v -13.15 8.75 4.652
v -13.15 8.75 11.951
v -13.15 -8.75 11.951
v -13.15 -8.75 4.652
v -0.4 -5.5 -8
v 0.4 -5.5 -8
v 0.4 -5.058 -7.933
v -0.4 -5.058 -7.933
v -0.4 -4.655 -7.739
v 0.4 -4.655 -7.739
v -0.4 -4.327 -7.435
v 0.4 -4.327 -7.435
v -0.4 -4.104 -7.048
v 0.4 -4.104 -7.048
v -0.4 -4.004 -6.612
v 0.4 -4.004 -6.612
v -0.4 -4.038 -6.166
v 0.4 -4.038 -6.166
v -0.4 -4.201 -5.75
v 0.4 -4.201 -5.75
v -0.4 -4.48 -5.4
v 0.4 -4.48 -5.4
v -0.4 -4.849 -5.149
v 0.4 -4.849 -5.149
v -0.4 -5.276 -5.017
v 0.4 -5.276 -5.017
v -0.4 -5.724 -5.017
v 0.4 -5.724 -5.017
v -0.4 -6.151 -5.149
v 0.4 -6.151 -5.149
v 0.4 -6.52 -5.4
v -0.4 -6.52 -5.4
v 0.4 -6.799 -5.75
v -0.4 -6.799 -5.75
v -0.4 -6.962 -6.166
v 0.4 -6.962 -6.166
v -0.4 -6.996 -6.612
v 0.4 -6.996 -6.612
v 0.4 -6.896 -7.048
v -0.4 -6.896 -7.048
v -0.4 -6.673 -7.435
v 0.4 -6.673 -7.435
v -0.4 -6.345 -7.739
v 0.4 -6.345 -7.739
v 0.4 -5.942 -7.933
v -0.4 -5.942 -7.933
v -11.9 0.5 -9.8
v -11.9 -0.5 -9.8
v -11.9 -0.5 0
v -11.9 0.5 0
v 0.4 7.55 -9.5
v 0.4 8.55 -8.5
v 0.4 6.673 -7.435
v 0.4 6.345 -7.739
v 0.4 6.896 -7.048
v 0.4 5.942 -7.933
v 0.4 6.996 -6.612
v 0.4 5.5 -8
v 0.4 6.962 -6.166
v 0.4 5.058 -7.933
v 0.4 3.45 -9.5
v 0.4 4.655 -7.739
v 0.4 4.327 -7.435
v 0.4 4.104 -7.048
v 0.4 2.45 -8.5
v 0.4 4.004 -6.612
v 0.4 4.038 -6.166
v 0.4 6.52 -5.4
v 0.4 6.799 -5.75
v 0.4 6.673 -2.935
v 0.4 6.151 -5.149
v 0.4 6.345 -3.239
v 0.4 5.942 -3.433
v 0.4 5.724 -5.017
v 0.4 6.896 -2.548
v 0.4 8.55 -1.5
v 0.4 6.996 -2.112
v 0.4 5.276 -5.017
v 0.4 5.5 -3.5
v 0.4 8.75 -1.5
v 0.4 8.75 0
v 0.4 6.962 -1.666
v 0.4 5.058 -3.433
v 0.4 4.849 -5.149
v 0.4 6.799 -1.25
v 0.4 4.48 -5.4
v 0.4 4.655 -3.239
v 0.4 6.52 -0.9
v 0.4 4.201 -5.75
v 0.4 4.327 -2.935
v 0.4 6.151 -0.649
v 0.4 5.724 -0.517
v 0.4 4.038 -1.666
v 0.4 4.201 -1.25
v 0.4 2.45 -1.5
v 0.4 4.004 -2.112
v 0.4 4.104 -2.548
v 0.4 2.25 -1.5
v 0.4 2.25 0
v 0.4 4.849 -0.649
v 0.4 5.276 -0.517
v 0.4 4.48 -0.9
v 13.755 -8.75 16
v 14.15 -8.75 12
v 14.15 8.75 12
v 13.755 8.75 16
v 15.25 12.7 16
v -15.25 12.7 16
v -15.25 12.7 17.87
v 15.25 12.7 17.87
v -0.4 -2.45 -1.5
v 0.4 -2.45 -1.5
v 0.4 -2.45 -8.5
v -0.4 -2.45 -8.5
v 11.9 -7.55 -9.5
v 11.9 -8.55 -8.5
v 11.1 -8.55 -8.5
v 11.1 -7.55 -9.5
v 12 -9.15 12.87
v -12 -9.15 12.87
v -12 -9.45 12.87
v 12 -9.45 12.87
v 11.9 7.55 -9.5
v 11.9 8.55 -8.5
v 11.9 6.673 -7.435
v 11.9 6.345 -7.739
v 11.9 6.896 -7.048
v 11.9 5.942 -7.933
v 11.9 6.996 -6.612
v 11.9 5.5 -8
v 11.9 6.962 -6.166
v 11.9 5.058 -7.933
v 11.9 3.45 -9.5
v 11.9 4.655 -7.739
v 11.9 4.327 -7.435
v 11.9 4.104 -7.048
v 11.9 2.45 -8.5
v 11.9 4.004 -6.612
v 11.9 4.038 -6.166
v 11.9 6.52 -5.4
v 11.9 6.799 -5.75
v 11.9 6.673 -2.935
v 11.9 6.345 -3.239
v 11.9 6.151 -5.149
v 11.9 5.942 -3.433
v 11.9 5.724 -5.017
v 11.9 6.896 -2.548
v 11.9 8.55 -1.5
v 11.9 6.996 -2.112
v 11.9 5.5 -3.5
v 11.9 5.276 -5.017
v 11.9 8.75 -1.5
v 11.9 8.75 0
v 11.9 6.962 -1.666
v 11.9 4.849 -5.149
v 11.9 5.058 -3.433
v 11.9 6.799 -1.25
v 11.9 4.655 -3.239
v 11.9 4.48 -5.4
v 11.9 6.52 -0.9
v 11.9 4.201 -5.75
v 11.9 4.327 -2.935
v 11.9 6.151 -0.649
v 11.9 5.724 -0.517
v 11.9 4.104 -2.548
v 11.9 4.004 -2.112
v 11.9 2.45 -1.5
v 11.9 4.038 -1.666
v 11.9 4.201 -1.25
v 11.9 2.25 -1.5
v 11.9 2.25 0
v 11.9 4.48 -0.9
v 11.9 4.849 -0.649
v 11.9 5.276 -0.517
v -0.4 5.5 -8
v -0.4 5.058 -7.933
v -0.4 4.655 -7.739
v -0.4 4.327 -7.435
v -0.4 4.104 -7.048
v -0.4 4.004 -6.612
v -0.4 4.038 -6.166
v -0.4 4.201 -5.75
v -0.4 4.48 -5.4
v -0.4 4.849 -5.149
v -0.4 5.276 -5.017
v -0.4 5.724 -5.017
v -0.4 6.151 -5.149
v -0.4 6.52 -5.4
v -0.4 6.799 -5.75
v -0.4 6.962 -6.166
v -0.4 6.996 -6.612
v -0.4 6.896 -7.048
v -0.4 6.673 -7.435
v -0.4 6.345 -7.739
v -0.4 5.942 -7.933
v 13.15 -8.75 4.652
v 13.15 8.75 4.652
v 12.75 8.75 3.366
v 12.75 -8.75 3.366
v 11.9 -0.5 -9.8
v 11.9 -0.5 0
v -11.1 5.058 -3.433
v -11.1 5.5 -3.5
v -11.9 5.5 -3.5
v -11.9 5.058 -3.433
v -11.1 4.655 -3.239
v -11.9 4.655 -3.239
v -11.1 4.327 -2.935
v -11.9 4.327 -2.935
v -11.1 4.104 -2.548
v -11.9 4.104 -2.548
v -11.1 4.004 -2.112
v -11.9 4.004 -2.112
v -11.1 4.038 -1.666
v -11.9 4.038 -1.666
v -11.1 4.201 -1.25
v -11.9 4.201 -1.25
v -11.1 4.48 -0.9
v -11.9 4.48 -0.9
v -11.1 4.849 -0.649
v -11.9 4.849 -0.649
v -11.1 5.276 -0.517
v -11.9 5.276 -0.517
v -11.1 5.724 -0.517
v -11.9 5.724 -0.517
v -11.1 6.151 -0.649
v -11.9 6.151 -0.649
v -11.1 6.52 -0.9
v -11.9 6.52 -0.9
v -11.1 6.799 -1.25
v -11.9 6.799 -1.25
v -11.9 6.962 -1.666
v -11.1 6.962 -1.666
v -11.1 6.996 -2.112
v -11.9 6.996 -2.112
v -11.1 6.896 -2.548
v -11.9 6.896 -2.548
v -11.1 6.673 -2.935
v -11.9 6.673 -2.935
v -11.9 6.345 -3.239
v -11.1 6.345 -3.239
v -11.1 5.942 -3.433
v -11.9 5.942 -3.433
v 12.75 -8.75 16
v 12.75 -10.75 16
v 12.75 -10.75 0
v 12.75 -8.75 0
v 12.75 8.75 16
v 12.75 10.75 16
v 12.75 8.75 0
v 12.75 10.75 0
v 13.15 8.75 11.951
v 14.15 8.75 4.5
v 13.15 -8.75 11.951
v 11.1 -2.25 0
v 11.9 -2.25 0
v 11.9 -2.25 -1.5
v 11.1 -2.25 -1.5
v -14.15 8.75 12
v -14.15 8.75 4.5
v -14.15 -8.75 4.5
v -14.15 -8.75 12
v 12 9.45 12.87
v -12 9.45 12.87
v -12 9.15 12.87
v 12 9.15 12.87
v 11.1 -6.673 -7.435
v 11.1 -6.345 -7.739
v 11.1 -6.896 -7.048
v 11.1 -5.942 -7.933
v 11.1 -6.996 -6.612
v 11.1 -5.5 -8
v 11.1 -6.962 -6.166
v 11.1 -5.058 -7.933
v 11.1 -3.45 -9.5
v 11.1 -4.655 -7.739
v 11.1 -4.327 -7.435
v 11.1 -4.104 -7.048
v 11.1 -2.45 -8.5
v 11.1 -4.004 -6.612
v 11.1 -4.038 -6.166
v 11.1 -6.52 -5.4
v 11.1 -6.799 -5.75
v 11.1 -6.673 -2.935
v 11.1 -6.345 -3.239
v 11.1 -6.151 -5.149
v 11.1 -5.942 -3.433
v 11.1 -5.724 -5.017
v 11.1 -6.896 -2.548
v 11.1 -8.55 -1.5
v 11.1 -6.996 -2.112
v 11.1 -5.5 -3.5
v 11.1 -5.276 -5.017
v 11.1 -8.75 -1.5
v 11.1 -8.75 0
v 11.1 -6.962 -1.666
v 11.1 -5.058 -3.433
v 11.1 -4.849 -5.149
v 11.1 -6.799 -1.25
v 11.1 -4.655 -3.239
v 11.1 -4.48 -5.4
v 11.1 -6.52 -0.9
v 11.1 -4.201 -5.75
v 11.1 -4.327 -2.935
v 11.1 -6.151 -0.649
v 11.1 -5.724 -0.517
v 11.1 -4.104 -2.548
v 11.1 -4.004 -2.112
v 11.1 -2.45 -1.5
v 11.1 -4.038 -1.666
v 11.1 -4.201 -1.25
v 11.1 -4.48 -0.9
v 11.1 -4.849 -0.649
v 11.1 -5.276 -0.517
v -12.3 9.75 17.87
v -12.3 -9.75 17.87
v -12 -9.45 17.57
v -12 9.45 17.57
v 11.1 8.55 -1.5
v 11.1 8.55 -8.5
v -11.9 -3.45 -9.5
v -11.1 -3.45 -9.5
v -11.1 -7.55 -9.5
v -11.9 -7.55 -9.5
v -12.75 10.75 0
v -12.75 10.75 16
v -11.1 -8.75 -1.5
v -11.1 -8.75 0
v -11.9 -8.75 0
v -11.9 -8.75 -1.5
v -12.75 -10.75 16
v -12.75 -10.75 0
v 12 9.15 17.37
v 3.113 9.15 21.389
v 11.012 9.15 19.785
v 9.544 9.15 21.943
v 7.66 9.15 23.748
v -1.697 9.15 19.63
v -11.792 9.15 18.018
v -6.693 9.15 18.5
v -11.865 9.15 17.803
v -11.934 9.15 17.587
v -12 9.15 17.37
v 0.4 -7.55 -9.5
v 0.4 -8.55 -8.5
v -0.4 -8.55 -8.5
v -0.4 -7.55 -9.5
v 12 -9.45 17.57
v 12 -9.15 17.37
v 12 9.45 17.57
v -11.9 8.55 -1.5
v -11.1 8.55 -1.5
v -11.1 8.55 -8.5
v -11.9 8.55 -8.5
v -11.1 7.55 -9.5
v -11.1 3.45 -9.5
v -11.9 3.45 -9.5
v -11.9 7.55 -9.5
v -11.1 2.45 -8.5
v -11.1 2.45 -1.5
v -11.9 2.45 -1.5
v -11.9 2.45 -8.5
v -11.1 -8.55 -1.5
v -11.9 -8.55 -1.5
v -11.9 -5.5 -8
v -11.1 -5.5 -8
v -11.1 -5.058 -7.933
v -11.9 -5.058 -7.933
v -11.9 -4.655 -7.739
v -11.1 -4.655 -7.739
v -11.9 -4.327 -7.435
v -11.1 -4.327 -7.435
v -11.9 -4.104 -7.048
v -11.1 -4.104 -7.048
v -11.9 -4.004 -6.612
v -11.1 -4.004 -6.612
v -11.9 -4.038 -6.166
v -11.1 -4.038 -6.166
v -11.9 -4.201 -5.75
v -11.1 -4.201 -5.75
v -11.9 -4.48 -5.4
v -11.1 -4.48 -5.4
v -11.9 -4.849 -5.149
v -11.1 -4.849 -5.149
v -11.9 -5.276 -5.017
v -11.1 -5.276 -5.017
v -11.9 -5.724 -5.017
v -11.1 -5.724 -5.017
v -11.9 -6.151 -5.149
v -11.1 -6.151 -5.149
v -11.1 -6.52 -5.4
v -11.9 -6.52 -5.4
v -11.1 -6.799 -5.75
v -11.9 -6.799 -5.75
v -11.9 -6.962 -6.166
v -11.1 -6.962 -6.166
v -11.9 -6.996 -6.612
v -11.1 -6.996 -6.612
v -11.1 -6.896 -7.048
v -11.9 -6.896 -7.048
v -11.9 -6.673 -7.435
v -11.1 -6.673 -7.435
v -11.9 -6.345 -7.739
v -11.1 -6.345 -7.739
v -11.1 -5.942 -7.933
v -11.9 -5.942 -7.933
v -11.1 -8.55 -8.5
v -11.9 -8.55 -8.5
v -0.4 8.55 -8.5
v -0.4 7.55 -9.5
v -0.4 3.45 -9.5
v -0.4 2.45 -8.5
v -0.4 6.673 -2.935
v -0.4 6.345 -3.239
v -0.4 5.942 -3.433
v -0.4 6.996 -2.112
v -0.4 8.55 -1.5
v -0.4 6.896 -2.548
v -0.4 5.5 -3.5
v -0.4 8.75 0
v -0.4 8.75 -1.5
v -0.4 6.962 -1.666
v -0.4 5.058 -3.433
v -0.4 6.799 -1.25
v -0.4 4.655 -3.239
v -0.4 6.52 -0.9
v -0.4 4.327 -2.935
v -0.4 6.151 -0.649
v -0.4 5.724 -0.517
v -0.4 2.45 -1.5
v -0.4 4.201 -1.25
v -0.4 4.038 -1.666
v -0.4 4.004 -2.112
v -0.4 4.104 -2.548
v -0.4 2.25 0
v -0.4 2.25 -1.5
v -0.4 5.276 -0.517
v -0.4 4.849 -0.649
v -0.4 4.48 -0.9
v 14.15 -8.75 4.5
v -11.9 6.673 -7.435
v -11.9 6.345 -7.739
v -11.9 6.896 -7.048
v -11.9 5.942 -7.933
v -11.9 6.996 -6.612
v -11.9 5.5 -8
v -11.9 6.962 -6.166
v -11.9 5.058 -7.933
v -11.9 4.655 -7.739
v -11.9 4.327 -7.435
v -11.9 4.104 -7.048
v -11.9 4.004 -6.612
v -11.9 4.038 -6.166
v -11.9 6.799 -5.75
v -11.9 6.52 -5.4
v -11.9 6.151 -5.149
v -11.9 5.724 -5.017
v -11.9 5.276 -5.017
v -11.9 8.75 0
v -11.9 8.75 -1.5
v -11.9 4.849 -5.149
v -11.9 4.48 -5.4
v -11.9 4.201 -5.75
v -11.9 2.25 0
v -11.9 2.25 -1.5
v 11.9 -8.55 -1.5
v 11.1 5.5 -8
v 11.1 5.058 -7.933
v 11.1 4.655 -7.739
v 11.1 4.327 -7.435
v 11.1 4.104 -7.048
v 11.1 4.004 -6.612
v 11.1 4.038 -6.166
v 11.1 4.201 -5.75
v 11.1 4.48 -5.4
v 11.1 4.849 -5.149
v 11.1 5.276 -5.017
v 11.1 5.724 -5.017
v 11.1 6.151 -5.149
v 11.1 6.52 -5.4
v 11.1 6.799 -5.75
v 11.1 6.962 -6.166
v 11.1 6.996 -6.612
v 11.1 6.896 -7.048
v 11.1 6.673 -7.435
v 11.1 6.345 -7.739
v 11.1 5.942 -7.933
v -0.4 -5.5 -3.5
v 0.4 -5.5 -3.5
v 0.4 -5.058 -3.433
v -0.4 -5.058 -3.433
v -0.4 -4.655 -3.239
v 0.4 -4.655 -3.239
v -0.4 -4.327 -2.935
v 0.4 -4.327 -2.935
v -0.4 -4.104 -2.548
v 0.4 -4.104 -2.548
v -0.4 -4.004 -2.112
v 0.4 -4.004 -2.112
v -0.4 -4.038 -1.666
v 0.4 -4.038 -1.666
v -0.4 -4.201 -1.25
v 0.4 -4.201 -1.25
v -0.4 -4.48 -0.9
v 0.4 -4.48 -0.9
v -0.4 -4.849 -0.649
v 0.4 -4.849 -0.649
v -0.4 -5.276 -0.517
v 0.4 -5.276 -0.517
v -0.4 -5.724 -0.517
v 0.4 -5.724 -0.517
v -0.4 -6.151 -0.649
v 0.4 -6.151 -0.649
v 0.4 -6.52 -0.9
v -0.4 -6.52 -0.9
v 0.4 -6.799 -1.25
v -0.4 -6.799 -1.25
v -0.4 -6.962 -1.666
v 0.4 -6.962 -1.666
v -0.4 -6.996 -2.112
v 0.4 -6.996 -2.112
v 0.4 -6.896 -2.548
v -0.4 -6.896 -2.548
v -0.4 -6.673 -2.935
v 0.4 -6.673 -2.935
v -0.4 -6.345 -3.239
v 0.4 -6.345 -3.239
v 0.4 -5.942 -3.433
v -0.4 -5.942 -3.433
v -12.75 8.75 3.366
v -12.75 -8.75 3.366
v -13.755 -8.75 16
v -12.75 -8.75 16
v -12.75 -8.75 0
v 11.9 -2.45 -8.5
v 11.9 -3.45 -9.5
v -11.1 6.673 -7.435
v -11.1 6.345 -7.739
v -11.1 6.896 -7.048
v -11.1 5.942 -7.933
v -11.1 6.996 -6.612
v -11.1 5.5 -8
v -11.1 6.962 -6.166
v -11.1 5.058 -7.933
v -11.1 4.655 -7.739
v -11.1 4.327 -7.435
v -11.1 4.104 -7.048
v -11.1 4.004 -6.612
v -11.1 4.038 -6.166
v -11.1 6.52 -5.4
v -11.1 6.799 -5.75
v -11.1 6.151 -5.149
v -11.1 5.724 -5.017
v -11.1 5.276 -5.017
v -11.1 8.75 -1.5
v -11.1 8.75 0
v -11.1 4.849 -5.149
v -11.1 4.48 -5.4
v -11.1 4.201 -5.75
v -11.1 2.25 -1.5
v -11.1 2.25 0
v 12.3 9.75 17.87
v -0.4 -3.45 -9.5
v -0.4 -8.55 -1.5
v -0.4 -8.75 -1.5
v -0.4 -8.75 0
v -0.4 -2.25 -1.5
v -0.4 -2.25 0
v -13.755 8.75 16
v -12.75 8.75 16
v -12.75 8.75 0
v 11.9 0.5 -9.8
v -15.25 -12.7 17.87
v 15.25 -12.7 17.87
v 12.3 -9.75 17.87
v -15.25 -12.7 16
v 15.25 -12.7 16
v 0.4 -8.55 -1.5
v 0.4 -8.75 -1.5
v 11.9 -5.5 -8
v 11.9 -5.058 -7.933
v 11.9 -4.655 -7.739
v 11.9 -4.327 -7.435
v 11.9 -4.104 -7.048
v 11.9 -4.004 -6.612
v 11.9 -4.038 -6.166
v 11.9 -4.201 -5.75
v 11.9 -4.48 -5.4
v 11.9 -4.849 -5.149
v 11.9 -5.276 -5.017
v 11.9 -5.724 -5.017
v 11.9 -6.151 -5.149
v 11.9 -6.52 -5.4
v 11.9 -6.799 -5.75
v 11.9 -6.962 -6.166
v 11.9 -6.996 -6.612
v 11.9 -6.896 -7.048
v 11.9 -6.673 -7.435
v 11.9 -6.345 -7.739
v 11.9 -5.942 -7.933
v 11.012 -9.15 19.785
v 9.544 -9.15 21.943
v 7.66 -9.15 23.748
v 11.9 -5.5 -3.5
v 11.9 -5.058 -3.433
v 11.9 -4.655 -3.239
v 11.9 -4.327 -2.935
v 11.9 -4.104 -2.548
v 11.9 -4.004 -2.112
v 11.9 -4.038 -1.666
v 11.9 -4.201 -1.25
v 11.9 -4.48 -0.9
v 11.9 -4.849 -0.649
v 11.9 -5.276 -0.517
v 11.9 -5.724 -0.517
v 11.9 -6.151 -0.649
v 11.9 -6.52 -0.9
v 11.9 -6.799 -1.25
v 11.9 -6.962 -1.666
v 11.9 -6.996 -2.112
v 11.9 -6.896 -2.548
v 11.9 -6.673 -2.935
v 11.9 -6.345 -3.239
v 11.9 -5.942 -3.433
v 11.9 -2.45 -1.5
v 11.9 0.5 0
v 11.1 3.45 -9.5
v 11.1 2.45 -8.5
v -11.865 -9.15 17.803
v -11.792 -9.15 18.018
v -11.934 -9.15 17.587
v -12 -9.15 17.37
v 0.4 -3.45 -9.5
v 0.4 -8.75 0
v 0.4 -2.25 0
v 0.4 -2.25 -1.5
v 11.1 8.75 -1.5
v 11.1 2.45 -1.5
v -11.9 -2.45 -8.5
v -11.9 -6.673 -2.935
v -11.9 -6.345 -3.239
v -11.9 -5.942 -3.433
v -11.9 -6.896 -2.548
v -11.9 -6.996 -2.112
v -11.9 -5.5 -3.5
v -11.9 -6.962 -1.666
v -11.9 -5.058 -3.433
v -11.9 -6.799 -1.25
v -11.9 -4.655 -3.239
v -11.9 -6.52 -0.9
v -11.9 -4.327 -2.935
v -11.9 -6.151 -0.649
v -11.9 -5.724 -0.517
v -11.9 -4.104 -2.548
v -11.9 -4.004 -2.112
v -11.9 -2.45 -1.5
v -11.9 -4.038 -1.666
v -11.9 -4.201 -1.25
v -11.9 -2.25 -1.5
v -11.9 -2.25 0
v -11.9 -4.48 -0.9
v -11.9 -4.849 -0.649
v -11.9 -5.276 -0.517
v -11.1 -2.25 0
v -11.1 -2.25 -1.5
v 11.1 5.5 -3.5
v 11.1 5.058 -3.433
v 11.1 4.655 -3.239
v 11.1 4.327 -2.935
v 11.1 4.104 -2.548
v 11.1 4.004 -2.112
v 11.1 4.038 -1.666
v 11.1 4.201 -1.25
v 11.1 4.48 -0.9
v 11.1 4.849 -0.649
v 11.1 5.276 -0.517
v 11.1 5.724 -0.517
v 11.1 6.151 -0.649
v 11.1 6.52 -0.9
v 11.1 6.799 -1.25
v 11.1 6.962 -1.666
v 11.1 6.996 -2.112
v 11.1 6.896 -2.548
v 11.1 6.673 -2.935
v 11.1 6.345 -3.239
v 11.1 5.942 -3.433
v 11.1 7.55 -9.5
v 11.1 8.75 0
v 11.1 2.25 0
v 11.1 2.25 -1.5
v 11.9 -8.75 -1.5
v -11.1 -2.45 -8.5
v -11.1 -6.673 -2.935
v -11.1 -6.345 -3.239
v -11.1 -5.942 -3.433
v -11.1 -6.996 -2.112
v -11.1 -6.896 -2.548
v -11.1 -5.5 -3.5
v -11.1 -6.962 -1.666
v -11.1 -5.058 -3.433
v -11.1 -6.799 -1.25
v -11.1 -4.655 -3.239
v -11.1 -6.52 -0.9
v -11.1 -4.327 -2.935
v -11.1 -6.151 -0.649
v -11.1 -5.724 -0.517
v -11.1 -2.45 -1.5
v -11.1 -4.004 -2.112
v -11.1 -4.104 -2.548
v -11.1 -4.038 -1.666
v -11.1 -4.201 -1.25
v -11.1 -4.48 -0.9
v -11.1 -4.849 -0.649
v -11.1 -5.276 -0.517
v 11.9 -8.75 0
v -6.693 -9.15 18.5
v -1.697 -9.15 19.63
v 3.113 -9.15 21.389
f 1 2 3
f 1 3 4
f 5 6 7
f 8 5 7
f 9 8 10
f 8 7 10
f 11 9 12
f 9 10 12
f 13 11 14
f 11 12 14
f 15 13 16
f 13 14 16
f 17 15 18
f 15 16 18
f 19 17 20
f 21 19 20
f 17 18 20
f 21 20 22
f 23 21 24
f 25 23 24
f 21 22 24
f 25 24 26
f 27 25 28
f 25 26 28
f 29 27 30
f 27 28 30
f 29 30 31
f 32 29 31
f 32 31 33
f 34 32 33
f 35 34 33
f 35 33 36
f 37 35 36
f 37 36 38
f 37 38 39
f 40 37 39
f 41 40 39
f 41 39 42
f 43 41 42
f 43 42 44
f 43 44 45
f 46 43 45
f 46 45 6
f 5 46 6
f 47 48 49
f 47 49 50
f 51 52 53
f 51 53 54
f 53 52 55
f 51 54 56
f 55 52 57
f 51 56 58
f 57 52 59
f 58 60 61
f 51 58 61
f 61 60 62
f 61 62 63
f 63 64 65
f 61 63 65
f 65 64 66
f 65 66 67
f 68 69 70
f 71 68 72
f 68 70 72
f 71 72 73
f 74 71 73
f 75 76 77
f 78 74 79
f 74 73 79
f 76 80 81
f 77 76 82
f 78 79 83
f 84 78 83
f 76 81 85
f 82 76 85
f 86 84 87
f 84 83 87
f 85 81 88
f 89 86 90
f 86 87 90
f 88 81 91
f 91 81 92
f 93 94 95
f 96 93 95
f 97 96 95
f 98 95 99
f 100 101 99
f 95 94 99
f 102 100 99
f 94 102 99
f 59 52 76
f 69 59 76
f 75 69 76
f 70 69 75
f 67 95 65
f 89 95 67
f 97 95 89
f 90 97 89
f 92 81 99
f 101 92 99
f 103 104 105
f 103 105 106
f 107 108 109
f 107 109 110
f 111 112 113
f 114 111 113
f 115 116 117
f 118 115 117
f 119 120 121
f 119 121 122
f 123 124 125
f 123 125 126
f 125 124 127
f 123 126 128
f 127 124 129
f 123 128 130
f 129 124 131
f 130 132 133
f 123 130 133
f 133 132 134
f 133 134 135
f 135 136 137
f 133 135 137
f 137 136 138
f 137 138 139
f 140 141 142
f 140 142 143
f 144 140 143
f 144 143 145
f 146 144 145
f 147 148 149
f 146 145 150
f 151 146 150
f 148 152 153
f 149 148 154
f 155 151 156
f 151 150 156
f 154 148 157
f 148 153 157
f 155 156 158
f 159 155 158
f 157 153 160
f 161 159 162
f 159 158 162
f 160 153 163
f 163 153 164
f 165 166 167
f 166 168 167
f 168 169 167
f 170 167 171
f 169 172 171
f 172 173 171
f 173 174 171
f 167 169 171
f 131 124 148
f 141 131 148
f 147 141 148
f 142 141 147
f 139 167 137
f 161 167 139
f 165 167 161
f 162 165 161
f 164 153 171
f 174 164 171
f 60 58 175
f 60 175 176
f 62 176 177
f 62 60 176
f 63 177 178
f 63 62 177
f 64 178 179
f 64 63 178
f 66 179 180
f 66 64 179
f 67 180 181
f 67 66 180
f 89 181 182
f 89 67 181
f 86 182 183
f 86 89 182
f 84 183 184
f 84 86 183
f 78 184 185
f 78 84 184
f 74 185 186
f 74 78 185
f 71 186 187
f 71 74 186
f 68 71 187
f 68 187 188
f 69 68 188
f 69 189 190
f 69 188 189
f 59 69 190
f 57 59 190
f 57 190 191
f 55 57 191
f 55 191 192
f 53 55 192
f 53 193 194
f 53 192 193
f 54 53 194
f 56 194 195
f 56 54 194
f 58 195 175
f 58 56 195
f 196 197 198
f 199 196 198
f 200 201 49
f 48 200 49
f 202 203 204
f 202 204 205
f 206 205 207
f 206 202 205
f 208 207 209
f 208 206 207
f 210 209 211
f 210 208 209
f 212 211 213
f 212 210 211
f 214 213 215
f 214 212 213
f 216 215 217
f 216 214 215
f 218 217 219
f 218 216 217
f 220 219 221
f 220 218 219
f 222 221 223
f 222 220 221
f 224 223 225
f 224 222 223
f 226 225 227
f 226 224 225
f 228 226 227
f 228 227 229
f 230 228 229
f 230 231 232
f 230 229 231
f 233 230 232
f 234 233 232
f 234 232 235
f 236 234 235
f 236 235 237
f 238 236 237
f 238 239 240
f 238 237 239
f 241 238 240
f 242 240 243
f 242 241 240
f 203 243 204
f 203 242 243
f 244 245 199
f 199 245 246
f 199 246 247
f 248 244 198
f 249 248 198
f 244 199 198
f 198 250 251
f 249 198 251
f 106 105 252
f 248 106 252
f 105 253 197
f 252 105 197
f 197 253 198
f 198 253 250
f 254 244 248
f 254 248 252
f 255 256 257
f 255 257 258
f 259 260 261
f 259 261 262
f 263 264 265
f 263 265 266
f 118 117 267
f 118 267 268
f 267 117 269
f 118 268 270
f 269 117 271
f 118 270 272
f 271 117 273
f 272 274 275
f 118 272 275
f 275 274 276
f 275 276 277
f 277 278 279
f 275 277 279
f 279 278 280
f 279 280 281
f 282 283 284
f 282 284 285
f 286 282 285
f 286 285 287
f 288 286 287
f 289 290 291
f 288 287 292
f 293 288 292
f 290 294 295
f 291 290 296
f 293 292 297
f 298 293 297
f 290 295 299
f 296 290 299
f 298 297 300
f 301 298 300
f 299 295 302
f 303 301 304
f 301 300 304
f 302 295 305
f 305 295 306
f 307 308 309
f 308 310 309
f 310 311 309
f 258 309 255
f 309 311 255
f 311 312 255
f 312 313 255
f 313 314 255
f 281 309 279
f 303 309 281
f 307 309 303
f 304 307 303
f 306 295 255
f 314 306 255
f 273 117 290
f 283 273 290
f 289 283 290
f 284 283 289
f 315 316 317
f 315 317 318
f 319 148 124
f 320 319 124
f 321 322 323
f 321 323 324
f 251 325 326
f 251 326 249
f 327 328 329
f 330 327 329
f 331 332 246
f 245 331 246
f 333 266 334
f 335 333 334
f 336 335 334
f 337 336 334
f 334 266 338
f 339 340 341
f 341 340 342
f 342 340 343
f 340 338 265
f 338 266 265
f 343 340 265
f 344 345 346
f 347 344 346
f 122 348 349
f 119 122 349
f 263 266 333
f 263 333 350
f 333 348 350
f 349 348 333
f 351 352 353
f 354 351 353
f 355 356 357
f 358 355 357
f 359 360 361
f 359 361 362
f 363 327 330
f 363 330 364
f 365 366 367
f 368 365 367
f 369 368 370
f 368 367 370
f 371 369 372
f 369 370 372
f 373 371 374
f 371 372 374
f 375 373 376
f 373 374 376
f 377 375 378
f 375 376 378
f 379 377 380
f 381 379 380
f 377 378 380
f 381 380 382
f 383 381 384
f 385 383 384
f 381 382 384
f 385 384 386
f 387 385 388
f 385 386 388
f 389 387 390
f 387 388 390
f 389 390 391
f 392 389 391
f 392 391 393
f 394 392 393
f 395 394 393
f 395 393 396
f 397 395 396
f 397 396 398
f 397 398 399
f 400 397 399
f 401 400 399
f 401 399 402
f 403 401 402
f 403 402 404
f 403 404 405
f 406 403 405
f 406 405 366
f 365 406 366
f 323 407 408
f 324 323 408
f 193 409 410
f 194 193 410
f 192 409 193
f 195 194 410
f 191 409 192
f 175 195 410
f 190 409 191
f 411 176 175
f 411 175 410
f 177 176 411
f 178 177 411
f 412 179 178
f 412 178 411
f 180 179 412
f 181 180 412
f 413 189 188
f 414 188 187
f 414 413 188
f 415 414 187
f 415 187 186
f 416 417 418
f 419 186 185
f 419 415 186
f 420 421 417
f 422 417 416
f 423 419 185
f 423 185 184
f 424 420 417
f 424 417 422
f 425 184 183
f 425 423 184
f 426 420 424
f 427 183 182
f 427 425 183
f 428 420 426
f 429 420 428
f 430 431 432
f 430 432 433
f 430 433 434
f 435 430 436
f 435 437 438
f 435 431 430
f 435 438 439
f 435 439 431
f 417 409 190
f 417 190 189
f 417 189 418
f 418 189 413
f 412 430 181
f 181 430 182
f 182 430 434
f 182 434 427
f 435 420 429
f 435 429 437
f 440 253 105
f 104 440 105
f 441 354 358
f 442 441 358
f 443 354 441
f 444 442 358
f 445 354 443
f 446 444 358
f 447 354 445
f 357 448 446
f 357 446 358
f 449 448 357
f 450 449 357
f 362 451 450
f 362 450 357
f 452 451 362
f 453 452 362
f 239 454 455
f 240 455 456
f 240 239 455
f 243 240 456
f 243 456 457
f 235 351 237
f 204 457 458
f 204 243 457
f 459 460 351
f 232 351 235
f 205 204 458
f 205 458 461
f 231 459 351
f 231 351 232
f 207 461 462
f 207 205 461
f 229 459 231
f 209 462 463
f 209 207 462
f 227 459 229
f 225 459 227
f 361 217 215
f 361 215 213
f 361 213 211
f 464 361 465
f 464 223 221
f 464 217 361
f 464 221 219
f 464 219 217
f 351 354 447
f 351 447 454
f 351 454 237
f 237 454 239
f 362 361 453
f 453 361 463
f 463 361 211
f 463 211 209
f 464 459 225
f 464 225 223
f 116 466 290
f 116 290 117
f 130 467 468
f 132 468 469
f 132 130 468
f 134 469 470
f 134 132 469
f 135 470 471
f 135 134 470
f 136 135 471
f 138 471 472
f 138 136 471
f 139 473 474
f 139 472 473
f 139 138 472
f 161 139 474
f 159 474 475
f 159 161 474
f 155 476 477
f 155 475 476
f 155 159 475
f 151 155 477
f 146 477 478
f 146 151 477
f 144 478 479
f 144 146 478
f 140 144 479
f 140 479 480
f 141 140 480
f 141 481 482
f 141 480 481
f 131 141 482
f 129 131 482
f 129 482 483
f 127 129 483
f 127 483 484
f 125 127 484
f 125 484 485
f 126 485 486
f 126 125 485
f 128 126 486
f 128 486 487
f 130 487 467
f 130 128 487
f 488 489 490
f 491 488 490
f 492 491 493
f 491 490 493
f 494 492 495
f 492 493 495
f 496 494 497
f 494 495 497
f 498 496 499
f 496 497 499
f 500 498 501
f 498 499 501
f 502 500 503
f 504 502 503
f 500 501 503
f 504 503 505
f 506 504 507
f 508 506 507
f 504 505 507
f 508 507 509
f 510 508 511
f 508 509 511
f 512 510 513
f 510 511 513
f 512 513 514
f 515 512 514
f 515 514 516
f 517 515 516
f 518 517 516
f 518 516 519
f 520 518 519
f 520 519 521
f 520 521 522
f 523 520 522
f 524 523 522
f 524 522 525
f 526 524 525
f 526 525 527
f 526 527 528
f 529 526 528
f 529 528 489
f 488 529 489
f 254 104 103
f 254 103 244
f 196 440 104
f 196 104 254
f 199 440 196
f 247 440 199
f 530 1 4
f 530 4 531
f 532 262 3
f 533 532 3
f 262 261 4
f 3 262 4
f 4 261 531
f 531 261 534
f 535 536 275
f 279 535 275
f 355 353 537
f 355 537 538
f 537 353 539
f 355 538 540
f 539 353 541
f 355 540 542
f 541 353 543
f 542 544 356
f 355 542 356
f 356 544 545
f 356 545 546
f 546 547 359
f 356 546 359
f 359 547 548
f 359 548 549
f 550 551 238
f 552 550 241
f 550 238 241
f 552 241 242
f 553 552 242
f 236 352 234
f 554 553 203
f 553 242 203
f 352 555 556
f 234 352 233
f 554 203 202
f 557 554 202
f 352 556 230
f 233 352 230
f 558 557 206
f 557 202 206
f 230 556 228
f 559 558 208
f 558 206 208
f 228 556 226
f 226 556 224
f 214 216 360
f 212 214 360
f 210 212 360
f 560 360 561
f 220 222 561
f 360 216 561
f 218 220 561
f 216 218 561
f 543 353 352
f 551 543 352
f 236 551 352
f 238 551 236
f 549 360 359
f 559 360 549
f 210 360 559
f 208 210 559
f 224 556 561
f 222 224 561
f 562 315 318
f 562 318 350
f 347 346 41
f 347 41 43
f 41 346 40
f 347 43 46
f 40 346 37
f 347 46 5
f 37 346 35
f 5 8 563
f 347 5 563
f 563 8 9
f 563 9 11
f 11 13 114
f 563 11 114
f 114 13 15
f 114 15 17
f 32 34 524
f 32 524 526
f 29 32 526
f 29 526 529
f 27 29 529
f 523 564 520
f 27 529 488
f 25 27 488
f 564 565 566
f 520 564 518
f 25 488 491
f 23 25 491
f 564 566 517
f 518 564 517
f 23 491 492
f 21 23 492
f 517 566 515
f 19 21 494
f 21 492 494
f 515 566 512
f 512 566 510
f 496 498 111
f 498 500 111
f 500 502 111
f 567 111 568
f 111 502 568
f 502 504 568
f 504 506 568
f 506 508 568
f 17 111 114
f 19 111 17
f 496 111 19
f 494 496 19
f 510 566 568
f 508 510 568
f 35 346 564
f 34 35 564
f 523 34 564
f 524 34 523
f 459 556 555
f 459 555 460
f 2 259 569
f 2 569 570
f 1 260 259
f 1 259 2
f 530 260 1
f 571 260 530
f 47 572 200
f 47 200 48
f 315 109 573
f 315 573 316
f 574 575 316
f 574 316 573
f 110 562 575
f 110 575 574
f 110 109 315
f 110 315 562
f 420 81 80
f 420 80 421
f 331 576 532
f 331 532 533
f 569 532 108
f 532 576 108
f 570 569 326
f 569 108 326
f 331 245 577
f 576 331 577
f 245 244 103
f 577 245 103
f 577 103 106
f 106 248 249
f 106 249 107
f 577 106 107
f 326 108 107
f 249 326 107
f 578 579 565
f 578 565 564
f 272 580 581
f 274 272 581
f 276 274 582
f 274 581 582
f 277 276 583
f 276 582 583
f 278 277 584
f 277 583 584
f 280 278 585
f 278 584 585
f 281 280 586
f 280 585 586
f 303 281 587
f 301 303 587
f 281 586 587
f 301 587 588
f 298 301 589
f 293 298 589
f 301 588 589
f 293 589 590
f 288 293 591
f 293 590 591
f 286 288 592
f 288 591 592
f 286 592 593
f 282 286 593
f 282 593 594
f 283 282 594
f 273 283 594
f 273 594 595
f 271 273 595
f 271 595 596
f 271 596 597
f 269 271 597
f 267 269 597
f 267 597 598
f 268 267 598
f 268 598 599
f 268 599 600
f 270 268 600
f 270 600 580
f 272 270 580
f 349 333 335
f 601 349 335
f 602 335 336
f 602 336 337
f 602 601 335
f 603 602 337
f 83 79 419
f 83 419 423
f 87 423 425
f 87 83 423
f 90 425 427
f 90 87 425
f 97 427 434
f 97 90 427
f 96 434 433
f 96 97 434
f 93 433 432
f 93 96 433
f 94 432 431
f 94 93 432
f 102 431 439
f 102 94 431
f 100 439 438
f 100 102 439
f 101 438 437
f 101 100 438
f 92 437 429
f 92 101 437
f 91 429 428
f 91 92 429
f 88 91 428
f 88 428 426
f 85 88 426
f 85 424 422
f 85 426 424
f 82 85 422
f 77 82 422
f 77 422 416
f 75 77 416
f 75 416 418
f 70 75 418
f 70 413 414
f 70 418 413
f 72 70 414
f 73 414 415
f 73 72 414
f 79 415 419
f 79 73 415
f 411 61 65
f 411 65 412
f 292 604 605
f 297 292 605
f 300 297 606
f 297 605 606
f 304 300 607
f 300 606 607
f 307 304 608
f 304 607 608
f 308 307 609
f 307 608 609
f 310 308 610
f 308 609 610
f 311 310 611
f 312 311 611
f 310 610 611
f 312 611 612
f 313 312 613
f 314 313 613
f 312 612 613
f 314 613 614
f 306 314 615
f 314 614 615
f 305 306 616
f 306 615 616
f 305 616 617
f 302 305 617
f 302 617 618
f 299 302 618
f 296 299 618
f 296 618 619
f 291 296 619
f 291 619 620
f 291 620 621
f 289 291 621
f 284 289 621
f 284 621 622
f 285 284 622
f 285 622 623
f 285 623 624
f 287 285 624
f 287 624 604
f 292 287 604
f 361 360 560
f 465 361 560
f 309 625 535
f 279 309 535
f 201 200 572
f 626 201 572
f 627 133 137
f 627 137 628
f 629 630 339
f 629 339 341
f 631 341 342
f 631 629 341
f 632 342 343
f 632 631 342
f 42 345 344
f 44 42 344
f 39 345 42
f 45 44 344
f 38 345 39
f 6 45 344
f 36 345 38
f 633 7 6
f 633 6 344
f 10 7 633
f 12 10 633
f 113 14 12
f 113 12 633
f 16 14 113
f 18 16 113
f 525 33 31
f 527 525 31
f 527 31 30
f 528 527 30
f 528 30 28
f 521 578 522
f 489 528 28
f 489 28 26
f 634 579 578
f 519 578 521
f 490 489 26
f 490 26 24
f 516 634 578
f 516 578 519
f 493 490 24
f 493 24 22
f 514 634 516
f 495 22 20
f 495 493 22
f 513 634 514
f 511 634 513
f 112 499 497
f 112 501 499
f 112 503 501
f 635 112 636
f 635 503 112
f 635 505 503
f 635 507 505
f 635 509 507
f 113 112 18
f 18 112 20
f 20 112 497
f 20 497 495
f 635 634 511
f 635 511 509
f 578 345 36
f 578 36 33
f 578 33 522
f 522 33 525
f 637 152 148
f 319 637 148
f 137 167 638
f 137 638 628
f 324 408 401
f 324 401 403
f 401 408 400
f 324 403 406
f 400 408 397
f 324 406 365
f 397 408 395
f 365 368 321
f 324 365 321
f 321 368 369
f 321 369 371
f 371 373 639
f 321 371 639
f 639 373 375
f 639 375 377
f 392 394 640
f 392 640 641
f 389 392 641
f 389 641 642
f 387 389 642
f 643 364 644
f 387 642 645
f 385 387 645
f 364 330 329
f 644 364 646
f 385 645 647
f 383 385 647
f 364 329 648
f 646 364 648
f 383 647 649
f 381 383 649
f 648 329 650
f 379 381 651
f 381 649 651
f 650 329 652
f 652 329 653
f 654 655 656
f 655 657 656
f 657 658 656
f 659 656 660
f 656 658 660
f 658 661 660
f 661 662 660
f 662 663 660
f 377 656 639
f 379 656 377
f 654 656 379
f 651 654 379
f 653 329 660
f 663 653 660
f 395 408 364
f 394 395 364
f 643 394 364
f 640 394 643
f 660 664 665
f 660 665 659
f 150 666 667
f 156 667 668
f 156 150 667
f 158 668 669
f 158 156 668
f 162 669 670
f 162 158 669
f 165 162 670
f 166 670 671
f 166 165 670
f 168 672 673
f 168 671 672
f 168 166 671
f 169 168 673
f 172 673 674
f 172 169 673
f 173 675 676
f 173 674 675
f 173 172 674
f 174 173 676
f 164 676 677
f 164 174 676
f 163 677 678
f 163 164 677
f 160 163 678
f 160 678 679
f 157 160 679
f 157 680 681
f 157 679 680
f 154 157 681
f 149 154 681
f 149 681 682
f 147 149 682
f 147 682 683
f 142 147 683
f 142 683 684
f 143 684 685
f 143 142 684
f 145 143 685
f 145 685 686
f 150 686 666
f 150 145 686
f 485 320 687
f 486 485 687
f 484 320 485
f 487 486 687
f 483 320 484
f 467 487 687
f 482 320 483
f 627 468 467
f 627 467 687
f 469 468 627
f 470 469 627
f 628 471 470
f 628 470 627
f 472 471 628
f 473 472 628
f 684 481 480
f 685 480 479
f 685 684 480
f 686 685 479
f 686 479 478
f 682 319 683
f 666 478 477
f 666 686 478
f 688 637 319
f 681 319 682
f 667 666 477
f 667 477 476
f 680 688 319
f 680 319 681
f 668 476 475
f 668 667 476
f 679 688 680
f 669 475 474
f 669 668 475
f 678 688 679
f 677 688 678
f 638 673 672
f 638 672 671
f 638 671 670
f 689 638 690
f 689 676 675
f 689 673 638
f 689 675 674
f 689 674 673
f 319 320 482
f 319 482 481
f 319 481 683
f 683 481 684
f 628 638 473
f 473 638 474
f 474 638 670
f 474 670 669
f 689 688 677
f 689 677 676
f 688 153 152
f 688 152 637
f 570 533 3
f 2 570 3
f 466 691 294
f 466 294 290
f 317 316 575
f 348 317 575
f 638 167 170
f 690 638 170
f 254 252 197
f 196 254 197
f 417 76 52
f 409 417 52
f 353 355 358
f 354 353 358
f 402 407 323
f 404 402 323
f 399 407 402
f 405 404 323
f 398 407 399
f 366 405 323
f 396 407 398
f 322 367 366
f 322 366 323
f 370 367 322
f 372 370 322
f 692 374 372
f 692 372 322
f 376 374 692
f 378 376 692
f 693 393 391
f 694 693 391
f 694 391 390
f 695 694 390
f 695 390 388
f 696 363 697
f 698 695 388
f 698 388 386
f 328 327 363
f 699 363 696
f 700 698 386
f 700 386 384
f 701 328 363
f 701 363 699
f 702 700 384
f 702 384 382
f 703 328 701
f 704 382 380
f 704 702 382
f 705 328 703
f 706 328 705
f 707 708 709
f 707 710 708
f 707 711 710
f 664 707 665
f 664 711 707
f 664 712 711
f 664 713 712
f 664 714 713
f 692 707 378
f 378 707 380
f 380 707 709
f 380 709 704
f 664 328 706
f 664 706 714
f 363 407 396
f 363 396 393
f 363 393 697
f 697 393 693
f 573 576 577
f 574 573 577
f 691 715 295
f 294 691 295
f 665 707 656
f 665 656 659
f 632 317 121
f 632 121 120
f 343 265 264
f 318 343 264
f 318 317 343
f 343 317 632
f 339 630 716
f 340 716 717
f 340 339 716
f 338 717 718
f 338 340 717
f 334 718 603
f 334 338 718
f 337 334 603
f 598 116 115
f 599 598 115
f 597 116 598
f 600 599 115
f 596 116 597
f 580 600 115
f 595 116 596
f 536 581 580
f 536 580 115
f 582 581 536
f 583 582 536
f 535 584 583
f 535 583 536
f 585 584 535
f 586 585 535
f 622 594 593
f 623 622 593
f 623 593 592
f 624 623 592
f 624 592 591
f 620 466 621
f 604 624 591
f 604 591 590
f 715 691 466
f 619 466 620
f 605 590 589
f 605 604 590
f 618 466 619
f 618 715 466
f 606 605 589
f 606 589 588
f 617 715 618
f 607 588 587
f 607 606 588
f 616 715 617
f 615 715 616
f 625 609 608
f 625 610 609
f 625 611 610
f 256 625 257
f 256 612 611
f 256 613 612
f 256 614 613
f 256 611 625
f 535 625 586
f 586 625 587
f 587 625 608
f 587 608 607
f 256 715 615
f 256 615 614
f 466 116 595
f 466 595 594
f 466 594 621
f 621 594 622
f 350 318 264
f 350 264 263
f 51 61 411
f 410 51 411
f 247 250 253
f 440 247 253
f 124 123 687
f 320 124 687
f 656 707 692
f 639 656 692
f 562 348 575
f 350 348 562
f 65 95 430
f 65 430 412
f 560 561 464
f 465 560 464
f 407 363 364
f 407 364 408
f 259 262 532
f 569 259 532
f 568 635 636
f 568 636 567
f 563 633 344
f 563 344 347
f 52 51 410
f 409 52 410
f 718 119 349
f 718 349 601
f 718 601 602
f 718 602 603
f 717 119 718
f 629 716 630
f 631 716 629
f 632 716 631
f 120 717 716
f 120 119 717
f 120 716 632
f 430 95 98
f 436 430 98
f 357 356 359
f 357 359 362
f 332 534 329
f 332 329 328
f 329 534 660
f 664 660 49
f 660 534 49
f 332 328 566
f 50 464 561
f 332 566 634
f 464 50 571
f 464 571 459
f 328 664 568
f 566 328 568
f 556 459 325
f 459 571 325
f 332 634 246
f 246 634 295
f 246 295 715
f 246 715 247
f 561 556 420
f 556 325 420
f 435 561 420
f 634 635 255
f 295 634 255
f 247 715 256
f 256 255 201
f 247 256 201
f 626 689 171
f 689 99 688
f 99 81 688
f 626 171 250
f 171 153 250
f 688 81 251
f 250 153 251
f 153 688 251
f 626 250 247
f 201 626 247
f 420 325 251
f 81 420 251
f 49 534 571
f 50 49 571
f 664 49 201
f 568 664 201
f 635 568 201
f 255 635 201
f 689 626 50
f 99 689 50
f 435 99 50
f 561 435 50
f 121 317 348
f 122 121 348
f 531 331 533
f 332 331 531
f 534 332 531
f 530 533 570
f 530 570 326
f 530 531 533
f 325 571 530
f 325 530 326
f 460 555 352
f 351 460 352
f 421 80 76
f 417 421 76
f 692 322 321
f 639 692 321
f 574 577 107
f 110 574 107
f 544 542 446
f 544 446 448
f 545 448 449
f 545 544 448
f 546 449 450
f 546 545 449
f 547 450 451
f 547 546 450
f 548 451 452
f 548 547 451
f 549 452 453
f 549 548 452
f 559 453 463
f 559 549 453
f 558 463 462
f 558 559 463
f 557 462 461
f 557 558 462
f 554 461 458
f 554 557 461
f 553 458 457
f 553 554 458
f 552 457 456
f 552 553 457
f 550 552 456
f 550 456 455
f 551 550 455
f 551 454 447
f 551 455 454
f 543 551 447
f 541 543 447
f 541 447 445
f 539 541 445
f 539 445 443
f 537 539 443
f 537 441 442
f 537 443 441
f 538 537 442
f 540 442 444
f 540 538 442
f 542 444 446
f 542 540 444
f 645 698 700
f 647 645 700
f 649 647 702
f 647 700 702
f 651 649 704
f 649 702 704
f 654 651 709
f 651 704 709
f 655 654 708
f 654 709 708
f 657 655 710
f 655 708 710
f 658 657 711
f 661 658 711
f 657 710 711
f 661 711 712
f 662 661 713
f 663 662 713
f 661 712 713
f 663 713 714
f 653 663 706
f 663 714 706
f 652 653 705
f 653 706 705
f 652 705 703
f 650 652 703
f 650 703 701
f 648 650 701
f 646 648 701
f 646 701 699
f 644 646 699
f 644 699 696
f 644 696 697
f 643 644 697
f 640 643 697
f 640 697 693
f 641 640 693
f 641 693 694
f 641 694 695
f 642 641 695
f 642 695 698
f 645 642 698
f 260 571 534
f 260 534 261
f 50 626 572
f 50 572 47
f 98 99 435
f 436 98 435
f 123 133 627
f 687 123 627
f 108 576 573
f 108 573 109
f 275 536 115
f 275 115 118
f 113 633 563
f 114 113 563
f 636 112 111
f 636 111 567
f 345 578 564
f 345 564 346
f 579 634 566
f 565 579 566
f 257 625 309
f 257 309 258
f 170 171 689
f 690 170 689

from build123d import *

# Parameters (mm, degrees)
SKETCH1_W                = 25.5
SKETCH1_H                = 21.5
BOSS_EXTRUDE1_DEPTH      = 16
SKETCH3_W                = 30.5
SKETCH3_H                = 25.4
BOSS_EXTRUDE3_DEPTH      = 1.87
SKETCH4_W                = 23.8
SKETCH4_H                = 1
BOSS_EXTRUDE4_DEPTH      = 9.8
SKETCH5_W                = 0.8
SKETCH5_H                = 6.5
BOSS_EXTRUDE5_DEPTH      = 9.5
SKETCH6_W                = 8
SKETCH6_H                = 0.2
CUT_EXTRUDE1_DEPTH       = 28.15
CHAMFER1_SIZE            = 1
SKETCH7_R                = 1.5
CUT_EXTRUDE2_DEPTH       = 28.15
CHAMFER1_OF_MIRROR1_SIZE = 1
BOSS_EXTRUDE6_START      = -2
BOSS_EXTRUDE6_DEPTH      = 17.5
SKETCH9_W                = 24
SKETCH9_H                = 18.9
CUT_EXTRUDE3_DEPTH       = 5
SKETCH10_R               = 12.5
BOSS_EXTRUDE7_DEPTH      = 9.15
SKETCH11_R               = 40
CUT_EXTRUDE4_DEPTH       = 13.7
CUT_EXTRUDE4_DEPTH_BACK  = 13.7
CHAMFER2_SIZE            = 0.3


with BuildPart() as part:
    # Sketch1 → Boss-Extrude1 (new body)
    with BuildSketch(Plane.XY):
        Rectangle(SKETCH1_W, SKETCH1_H)
    extrude(amount=BOSS_EXTRUDE1_DEPTH)

    # Sketch3 → Boss-Extrude3 (add)
    with BuildSketch(Plane.XY.offset(16)):
        Rectangle(SKETCH3_W, SKETCH3_H)
    extrude(amount=BOSS_EXTRUDE3_DEPTH)

    # Sketch4 → Boss-Extrude4 (add)
    with BuildSketch(Plane(origin=(0, 0, 0), x_dir=(-1, 0, 0), z_dir=(0, 0, -1))):
        Rectangle(SKETCH4_W, SKETCH4_H)
    extrude(amount=BOSS_EXTRUDE4_DEPTH)

    # Sketch5 → Boss-Extrude5 (add)
    with BuildSketch(Plane(origin=(0, 0, 0), x_dir=(-1, 0, 0), z_dir=(0, 0, -1))):
        with Locations((11.5, -5.5)):
            Rectangle(SKETCH5_W, SKETCH5_H)
        with Locations((0, -5.5)):
            Rectangle(SKETCH5_W, SKETCH5_H)
        with Locations((-11.5, -5.5)):
            Rectangle(SKETCH5_W, SKETCH5_H)
    boss_extrude5 = extrude(amount=BOSS_EXTRUDE5_DEPTH)

    # Sketch6 → Cut-Extrude1 (cut, through all)
    with BuildSketch(Plane(origin=(11.9, 0, 0), x_dir=(0, 0, -1), z_dir=(1, 0, 0))):
        with Locations((5.5, -2.35)):
            Rectangle(SKETCH6_W, SKETCH6_H)
        with Locations((5.5, -8.65)):
            Rectangle(SKETCH6_W, SKETCH6_H)
    cut_extrude1 = extrude(amount=-CUT_EXTRUDE1_DEPTH, mode=Mode.SUBTRACT)

    # Chamfer1
    chamfer1_edges = [part.edges().sort_by_distance(p)[0] for p in [
        (-11.5, -2.45, -9.5),
        (0, -2.45, -9.5),
        (-11.5, -8.55, -9.5),
        (0, -8.55, -9.5),
        (11.5, -8.55, -9.5),
        (11.5, -2.45, -9.5),
    ]]
    chamfer(chamfer1_edges, length=CHAMFER1_SIZE)

    # Sketch7 → Cut-Extrude2 (cut, through all)
    with BuildSketch(Plane(origin=(11.9, 0, 0), x_dir=(0, 0, -1), z_dir=(1, 0, 0))):
        with Locations((6.5, -5.5)):
            Circle(SKETCH7_R)
        with Locations((2, -5.5)):
            Circle(SKETCH7_R)
    cut_extrude2 = extrude(amount=-CUT_EXTRUDE2_DEPTH, mode=Mode.SUBTRACT)

    # Mirror1: Boss-Extrude5, Cut-Extrude1, Cut-Extrude2 across plane
    add(boss_extrude5.mirror(Plane(origin=(0, 0, 0), x_dir=(0, 0, 1), z_dir=(0, -1, 0))))
    add(cut_extrude1.mirror(Plane(origin=(0, 0, 0), x_dir=(0, 0, 1), z_dir=(0, -1, 0))), mode=Mode.SUBTRACT)
    add(cut_extrude2.mirror(Plane(origin=(0, 0, 0), x_dir=(0, 0, 1), z_dir=(0, -1, 0))), mode=Mode.SUBTRACT)

    # Chamfer1 of Mirror1
    chamfer1_of_mirror1_edges = [part.edges().sort_by_distance(p)[0] for p in [
        (-11.5, 2.45, -9.5),
        (0, 2.45, -9.5),
        (-11.5, 8.55, -9.5),
        (0, 8.55, -9.5),
        (11.5, 8.55, -9.5),
        (11.5, 2.45, -9.5),
    ]]
    chamfer(chamfer1_of_mirror1_edges, length=CHAMFER1_OF_MIRROR1_SIZE)

    # Sketch8 → Boss-Extrude6 (add)
    with BuildSketch(Plane(origin=(0, 10.75, 0), x_dir=(1, 0, 0), z_dir=(0, 1, 0)).offset(BOSS_EXTRUDE6_START)):
        Polygon((-12.75, 0), (-14.15, -4.5), (-14.15, -12), (-13.754867215, -16), (-12.75, -16), (-13.15, -11.95072831), (-13.15, -4.651963334), (-12.75, -3.366249048), align=None)
    boss_extrude6 = extrude(amount=-BOSS_EXTRUDE6_DEPTH)

    # Mirror2: Boss-Extrude6 across plane
    add(boss_extrude6.mirror(Plane.ZY))

    # Sketch9 → Cut-Extrude3 (cut)
    with BuildSketch(Plane.XY.offset(17.87)):
        Rectangle(SKETCH9_W, SKETCH9_H)
    extrude(amount=-CUT_EXTRUDE3_DEPTH, mode=Mode.SUBTRACT)

    # Sketch10 → Boss-Extrude7 (add, symmetric)
    with BuildSketch(Plane(origin=(0, 0, 0), x_dir=(-1, 0, 0), z_dir=(0, -1, 0))):
        with Locations((0, -13.87)):
            Circle(SKETCH10_R)
    extrude(amount=BOSS_EXTRUDE7_DEPTH, both=True)

    # Sketch11 → Cut-Extrude4 (cut, two sides)
    with BuildSketch(Plane(origin=(0, 0, 0), x_dir=(-1, 0, 0), z_dir=(0, -1, 0))) as cut_extrude4_sk:
        with Locations((13, -58)):
            Circle(SKETCH11_R)
    extrude(amount=CUT_EXTRUDE4_DEPTH, mode=Mode.SUBTRACT)
    extrude(cut_extrude4_sk.sketch, amount=-CUT_EXTRUDE4_DEPTH_BACK, mode=Mode.SUBTRACT)

    # Chamfer2
    chamfer2_edges = [part.edges().sort_by_distance(p)[0] for p in [
        (-12, 0, 17.87),
        (0, 9.45, 17.87),
        (0, -9.45, 17.87),
        (12, 0, 17.87),
    ]]
    chamfer(chamfer2_edges, length=CHAMFER2_SIZE)


solid = part.part
